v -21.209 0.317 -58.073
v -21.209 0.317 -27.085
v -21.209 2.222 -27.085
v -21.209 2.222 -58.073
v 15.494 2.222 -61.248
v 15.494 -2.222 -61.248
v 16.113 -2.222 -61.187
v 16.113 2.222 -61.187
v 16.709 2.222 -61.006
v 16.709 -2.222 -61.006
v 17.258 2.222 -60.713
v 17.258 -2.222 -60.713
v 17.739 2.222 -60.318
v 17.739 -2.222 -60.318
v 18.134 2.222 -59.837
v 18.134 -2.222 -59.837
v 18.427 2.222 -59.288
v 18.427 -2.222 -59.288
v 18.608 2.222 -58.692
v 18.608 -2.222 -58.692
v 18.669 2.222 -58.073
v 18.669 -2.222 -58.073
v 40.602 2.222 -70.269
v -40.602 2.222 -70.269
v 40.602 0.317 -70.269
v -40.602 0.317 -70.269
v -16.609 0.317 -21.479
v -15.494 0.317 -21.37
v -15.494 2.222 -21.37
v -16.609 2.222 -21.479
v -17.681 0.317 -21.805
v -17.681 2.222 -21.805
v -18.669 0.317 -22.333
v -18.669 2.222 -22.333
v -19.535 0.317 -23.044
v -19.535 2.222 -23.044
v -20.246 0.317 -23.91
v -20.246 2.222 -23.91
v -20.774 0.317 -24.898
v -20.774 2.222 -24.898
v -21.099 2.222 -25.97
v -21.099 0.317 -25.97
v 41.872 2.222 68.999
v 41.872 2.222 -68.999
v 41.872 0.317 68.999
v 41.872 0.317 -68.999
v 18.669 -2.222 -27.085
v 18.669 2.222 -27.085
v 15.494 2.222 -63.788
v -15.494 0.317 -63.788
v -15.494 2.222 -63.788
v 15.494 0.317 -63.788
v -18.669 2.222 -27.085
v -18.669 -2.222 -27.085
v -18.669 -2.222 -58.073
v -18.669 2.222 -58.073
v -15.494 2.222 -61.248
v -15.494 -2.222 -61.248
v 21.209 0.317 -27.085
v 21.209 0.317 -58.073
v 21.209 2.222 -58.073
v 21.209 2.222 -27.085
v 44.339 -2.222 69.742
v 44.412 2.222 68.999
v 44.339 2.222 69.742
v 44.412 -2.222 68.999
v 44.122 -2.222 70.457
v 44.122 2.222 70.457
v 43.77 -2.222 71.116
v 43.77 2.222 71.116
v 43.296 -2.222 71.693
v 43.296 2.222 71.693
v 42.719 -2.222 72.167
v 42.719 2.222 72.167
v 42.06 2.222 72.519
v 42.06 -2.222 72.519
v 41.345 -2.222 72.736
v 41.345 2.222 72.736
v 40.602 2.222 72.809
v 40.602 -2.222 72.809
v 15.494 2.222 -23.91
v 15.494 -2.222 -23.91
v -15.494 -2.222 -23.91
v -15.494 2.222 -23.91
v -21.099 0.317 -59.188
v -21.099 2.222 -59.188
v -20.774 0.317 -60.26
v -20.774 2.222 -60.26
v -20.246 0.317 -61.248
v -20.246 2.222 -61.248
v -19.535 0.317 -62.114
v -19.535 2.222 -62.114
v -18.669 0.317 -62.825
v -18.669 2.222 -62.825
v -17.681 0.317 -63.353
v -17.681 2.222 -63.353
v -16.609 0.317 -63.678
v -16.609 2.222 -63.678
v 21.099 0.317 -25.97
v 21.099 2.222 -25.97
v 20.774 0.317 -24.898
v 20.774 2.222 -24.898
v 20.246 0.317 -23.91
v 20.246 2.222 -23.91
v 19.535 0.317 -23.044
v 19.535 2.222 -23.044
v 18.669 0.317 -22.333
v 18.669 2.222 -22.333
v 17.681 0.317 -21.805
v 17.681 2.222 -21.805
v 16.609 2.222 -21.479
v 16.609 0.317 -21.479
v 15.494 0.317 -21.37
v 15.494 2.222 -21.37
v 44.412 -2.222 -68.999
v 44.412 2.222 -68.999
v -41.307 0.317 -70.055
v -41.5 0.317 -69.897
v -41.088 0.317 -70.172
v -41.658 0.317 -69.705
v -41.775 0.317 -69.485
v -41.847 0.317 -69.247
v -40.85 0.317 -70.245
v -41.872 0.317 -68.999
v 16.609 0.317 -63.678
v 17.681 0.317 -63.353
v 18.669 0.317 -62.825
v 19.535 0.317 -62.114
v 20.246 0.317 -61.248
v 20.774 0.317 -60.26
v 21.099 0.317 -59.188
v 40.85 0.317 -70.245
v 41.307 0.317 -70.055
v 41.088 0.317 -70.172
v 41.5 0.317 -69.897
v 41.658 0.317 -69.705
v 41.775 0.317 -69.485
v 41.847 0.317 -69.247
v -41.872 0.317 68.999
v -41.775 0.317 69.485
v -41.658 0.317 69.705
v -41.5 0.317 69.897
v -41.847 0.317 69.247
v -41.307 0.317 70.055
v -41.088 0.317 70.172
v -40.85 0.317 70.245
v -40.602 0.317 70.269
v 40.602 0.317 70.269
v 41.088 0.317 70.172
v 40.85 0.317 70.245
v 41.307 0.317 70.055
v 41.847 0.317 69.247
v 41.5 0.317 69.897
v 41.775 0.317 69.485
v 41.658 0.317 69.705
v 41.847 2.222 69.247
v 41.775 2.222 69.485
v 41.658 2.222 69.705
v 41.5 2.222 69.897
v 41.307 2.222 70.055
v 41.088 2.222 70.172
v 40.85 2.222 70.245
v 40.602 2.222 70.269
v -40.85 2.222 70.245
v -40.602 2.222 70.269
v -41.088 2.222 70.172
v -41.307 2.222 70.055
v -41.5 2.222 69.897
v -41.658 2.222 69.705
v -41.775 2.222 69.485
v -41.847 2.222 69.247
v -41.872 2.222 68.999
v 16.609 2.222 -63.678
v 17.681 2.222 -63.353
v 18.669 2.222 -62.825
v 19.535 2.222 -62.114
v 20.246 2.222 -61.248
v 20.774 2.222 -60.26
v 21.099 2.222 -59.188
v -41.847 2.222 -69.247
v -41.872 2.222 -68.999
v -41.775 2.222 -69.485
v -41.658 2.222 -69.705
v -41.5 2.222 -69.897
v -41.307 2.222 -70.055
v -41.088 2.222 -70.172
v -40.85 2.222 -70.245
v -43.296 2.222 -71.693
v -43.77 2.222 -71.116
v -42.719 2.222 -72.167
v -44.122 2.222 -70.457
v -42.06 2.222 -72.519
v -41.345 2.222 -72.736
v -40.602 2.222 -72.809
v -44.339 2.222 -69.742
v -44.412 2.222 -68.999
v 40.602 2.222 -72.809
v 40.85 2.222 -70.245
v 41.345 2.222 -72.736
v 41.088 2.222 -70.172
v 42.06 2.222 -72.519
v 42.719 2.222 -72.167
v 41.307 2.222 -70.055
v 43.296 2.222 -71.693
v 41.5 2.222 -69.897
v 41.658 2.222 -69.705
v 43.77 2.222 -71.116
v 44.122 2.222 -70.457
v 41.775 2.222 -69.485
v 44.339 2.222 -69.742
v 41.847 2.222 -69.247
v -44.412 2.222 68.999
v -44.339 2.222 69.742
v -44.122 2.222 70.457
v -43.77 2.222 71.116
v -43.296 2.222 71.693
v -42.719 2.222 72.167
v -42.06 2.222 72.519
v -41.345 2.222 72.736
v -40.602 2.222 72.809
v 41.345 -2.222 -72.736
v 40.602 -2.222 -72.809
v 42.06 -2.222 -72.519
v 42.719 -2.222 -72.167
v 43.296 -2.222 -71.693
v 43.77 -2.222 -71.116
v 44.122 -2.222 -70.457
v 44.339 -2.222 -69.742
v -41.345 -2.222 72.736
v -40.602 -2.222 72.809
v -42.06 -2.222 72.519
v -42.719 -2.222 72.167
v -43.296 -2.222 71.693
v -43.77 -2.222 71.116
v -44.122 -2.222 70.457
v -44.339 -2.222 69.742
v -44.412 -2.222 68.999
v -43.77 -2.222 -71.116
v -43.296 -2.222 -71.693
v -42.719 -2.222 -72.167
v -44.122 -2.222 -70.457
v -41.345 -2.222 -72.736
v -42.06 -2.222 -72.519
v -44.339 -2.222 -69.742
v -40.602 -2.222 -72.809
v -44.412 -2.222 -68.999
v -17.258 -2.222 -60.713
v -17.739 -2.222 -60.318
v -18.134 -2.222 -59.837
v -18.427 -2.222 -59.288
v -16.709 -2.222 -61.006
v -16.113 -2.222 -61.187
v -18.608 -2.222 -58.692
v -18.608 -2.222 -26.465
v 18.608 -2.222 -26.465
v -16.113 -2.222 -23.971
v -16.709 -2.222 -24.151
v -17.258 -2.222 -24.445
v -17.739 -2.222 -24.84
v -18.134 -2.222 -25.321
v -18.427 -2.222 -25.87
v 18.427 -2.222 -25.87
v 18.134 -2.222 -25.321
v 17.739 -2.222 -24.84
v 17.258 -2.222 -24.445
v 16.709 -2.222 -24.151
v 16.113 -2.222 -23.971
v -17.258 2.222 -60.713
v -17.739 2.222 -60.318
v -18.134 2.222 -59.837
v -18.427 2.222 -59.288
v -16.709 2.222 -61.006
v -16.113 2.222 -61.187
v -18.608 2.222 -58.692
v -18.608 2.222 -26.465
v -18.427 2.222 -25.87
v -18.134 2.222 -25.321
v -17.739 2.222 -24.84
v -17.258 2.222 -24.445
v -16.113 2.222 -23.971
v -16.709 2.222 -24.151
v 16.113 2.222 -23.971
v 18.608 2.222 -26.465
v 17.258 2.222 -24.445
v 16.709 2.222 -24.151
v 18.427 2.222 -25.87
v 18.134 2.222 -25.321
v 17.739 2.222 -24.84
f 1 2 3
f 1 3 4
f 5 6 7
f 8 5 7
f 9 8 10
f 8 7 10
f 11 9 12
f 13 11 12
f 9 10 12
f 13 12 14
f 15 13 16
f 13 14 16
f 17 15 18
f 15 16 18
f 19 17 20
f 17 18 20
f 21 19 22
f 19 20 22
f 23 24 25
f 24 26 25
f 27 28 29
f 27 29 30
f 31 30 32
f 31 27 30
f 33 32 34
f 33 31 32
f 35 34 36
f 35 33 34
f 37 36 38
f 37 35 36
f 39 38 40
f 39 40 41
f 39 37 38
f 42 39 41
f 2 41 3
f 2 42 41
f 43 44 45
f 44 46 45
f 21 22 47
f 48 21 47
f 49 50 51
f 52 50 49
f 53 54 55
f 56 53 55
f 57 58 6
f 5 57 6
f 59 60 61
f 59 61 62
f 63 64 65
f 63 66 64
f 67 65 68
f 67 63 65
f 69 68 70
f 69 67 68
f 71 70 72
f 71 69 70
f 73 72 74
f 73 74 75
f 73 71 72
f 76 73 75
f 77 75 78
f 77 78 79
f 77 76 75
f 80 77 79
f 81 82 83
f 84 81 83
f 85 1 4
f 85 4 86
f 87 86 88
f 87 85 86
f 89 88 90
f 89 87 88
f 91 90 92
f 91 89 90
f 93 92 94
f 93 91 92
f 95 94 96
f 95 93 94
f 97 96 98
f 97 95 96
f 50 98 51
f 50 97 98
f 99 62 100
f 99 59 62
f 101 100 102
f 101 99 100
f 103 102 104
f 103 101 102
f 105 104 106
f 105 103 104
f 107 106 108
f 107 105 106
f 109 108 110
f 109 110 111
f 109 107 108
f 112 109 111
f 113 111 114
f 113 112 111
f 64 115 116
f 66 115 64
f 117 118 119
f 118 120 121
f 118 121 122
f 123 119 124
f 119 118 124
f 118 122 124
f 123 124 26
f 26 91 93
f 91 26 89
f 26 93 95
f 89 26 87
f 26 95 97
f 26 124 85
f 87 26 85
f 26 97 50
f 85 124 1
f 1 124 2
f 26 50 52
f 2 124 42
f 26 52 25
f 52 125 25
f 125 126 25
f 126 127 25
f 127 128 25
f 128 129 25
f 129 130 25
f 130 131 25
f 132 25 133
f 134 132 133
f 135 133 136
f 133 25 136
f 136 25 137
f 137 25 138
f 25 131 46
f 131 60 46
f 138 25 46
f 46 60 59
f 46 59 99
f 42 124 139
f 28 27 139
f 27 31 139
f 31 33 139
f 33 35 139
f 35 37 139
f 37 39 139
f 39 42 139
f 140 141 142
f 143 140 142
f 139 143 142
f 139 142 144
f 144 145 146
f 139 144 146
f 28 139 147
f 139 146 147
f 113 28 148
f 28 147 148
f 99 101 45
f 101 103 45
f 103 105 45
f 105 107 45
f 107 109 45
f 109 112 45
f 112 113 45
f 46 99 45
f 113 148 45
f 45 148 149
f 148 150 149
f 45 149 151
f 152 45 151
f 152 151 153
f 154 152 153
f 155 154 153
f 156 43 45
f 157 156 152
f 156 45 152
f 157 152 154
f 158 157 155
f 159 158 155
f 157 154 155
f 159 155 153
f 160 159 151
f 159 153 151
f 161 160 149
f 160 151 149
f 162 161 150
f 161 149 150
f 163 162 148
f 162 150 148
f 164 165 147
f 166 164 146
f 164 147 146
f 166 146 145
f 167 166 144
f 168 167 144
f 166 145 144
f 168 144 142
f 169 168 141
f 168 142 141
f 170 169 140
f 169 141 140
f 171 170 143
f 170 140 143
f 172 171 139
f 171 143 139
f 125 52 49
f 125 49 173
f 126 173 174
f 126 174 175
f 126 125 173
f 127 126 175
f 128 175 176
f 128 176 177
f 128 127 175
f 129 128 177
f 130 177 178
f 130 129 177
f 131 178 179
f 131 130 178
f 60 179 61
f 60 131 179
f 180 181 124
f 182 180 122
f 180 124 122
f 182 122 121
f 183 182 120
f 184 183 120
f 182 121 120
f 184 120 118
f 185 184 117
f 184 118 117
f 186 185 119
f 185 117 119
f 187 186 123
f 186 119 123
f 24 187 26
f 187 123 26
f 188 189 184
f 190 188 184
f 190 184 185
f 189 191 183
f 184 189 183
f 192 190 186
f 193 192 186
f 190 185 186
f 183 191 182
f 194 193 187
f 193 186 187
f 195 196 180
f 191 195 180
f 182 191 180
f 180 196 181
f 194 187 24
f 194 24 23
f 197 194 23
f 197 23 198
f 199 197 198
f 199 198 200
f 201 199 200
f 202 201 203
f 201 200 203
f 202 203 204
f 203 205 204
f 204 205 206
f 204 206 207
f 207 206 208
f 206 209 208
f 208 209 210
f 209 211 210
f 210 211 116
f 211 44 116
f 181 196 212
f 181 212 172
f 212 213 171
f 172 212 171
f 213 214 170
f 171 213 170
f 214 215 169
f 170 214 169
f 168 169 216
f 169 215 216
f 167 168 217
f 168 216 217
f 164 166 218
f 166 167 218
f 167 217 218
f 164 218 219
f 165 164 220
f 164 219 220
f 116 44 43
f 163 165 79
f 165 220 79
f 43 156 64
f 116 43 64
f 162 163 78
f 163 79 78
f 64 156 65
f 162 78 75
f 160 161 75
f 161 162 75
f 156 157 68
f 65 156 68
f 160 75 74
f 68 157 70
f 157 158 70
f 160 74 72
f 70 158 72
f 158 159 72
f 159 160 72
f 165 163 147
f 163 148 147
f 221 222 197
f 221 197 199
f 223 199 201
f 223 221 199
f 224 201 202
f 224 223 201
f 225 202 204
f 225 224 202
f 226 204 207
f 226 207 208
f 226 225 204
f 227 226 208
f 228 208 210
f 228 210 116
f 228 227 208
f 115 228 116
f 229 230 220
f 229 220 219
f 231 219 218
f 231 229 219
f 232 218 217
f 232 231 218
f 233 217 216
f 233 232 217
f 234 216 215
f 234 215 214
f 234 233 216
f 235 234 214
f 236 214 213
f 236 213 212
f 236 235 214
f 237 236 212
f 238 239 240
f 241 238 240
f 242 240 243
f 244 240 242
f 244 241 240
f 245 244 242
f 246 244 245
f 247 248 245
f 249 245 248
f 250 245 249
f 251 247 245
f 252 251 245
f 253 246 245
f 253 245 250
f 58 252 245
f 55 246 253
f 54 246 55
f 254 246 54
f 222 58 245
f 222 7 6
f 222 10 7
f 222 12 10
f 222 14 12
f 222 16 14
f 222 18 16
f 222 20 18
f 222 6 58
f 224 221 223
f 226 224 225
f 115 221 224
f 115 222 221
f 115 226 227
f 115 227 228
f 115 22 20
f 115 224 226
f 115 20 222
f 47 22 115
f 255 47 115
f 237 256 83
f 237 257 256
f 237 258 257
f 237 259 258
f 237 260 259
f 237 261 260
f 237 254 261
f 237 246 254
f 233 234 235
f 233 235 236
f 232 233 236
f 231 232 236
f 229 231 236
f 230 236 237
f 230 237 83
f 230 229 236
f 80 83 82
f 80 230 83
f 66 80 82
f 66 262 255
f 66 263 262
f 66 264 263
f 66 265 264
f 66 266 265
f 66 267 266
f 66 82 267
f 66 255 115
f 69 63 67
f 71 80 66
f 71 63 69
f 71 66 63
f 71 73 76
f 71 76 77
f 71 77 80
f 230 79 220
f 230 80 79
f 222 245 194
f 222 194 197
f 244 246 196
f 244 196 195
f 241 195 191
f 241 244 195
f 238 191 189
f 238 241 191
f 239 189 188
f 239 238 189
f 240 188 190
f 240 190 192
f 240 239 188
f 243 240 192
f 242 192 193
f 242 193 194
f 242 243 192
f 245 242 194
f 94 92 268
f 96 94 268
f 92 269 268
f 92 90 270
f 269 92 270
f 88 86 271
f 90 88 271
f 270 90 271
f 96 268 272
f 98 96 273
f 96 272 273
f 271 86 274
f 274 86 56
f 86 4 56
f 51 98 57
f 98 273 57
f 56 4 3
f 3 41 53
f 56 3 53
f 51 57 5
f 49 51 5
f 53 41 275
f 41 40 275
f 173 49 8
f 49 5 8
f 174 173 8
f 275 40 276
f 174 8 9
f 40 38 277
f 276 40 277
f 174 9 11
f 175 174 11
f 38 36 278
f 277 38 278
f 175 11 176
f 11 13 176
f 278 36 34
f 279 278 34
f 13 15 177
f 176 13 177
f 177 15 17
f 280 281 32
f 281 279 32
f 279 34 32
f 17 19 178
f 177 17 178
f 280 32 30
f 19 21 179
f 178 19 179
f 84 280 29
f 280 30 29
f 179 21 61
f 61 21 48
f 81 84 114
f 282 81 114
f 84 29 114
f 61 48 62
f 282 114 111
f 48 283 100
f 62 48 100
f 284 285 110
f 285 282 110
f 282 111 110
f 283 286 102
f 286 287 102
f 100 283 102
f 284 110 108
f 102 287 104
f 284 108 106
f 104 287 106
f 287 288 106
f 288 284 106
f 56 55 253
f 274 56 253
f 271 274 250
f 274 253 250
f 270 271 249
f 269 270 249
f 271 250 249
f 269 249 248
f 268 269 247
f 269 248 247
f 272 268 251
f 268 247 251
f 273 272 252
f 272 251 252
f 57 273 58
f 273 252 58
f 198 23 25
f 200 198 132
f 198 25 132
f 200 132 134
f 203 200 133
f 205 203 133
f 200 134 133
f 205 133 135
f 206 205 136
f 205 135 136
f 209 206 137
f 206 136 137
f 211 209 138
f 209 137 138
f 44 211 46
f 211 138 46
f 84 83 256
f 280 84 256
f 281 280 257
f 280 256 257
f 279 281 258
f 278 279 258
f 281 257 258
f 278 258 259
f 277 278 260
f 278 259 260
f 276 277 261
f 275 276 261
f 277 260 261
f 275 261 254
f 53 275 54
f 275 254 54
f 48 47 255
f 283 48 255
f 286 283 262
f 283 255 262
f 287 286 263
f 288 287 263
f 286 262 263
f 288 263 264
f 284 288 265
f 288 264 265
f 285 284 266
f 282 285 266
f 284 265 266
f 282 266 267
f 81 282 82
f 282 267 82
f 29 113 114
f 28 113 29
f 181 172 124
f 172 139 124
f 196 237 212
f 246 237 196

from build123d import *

# Parameters (mm, degrees)
F2_DEPTH = 2.2225
F3_DEPTH = 12.7
F4_T     = -2.54


with BuildPart() as f2:
    # F0 (on Front) → F2 (new body, symmetric)
    with BuildSketch(Plane.XZ):
        with BuildLine():
            Line((40.6019, 72.8091), (-40.6019, 72.8091))
            ThreePointArc((-40.6019, 72.8091), (-43.295977, 71.693177), (-44.4119, 68.9991))
            Line((-44.4119, 68.9991), (-44.4119, -68.9991))
            ThreePointArc((-44.4119, -68.9991), (-43.295977, -71.693177), (-40.6019, -72.8091))
            Line((-40.6019, -72.8091), (40.6019, -72.8091))
            ThreePointArc((40.6019, -72.8091), (43.295977, -71.693177), (44.4119, -68.9991))
            Line((44.4119, -68.9991), (44.4119, 68.9991))
            ThreePointArc((44.4119, 68.9991), (43.295977, 71.693177), (40.6019, 72.8091))
        make_face()
    extrude(amount=F2_DEPTH, both=True)

    # F1 (on face) → F3 (cut, symmetric)
    with BuildSketch(Plane.XZ):
        with BuildLine():
            Line((15.494, -23.90966), (-15.494, -23.90966))
            ThreePointArc((-15.494, -23.90966), (-17.739064, -24.839596), (-18.669, -27.08466))
            Line((-18.669, -27.08466), (-18.669, -58.07266))
            ThreePointArc((-18.669, -58.07266), (-17.739064, -60.317724), (-15.494, -61.24766))
            Line((-15.494, -61.24766), (15.494, -61.24766))
            ThreePointArc((15.494, -61.24766), (17.739064, -60.317724), (18.669, -58.07266))
            Line((18.669, -58.07266), (18.669, -27.08466))
            ThreePointArc((18.669, -27.08466), (17.739064, -24.839596), (15.494, -23.90966))
        make_face()
    extrude(amount=F3_DEPTH, both=True, mode=Mode.SUBTRACT)

    # F4
    f4_openings = [f2.faces().sort_by_distance(p)[0] for p in [
        (0, 2.2225, 5.113505),
    ]]
    offset(amount=F4_T, openings=f4_openings)


solid = f2.part
